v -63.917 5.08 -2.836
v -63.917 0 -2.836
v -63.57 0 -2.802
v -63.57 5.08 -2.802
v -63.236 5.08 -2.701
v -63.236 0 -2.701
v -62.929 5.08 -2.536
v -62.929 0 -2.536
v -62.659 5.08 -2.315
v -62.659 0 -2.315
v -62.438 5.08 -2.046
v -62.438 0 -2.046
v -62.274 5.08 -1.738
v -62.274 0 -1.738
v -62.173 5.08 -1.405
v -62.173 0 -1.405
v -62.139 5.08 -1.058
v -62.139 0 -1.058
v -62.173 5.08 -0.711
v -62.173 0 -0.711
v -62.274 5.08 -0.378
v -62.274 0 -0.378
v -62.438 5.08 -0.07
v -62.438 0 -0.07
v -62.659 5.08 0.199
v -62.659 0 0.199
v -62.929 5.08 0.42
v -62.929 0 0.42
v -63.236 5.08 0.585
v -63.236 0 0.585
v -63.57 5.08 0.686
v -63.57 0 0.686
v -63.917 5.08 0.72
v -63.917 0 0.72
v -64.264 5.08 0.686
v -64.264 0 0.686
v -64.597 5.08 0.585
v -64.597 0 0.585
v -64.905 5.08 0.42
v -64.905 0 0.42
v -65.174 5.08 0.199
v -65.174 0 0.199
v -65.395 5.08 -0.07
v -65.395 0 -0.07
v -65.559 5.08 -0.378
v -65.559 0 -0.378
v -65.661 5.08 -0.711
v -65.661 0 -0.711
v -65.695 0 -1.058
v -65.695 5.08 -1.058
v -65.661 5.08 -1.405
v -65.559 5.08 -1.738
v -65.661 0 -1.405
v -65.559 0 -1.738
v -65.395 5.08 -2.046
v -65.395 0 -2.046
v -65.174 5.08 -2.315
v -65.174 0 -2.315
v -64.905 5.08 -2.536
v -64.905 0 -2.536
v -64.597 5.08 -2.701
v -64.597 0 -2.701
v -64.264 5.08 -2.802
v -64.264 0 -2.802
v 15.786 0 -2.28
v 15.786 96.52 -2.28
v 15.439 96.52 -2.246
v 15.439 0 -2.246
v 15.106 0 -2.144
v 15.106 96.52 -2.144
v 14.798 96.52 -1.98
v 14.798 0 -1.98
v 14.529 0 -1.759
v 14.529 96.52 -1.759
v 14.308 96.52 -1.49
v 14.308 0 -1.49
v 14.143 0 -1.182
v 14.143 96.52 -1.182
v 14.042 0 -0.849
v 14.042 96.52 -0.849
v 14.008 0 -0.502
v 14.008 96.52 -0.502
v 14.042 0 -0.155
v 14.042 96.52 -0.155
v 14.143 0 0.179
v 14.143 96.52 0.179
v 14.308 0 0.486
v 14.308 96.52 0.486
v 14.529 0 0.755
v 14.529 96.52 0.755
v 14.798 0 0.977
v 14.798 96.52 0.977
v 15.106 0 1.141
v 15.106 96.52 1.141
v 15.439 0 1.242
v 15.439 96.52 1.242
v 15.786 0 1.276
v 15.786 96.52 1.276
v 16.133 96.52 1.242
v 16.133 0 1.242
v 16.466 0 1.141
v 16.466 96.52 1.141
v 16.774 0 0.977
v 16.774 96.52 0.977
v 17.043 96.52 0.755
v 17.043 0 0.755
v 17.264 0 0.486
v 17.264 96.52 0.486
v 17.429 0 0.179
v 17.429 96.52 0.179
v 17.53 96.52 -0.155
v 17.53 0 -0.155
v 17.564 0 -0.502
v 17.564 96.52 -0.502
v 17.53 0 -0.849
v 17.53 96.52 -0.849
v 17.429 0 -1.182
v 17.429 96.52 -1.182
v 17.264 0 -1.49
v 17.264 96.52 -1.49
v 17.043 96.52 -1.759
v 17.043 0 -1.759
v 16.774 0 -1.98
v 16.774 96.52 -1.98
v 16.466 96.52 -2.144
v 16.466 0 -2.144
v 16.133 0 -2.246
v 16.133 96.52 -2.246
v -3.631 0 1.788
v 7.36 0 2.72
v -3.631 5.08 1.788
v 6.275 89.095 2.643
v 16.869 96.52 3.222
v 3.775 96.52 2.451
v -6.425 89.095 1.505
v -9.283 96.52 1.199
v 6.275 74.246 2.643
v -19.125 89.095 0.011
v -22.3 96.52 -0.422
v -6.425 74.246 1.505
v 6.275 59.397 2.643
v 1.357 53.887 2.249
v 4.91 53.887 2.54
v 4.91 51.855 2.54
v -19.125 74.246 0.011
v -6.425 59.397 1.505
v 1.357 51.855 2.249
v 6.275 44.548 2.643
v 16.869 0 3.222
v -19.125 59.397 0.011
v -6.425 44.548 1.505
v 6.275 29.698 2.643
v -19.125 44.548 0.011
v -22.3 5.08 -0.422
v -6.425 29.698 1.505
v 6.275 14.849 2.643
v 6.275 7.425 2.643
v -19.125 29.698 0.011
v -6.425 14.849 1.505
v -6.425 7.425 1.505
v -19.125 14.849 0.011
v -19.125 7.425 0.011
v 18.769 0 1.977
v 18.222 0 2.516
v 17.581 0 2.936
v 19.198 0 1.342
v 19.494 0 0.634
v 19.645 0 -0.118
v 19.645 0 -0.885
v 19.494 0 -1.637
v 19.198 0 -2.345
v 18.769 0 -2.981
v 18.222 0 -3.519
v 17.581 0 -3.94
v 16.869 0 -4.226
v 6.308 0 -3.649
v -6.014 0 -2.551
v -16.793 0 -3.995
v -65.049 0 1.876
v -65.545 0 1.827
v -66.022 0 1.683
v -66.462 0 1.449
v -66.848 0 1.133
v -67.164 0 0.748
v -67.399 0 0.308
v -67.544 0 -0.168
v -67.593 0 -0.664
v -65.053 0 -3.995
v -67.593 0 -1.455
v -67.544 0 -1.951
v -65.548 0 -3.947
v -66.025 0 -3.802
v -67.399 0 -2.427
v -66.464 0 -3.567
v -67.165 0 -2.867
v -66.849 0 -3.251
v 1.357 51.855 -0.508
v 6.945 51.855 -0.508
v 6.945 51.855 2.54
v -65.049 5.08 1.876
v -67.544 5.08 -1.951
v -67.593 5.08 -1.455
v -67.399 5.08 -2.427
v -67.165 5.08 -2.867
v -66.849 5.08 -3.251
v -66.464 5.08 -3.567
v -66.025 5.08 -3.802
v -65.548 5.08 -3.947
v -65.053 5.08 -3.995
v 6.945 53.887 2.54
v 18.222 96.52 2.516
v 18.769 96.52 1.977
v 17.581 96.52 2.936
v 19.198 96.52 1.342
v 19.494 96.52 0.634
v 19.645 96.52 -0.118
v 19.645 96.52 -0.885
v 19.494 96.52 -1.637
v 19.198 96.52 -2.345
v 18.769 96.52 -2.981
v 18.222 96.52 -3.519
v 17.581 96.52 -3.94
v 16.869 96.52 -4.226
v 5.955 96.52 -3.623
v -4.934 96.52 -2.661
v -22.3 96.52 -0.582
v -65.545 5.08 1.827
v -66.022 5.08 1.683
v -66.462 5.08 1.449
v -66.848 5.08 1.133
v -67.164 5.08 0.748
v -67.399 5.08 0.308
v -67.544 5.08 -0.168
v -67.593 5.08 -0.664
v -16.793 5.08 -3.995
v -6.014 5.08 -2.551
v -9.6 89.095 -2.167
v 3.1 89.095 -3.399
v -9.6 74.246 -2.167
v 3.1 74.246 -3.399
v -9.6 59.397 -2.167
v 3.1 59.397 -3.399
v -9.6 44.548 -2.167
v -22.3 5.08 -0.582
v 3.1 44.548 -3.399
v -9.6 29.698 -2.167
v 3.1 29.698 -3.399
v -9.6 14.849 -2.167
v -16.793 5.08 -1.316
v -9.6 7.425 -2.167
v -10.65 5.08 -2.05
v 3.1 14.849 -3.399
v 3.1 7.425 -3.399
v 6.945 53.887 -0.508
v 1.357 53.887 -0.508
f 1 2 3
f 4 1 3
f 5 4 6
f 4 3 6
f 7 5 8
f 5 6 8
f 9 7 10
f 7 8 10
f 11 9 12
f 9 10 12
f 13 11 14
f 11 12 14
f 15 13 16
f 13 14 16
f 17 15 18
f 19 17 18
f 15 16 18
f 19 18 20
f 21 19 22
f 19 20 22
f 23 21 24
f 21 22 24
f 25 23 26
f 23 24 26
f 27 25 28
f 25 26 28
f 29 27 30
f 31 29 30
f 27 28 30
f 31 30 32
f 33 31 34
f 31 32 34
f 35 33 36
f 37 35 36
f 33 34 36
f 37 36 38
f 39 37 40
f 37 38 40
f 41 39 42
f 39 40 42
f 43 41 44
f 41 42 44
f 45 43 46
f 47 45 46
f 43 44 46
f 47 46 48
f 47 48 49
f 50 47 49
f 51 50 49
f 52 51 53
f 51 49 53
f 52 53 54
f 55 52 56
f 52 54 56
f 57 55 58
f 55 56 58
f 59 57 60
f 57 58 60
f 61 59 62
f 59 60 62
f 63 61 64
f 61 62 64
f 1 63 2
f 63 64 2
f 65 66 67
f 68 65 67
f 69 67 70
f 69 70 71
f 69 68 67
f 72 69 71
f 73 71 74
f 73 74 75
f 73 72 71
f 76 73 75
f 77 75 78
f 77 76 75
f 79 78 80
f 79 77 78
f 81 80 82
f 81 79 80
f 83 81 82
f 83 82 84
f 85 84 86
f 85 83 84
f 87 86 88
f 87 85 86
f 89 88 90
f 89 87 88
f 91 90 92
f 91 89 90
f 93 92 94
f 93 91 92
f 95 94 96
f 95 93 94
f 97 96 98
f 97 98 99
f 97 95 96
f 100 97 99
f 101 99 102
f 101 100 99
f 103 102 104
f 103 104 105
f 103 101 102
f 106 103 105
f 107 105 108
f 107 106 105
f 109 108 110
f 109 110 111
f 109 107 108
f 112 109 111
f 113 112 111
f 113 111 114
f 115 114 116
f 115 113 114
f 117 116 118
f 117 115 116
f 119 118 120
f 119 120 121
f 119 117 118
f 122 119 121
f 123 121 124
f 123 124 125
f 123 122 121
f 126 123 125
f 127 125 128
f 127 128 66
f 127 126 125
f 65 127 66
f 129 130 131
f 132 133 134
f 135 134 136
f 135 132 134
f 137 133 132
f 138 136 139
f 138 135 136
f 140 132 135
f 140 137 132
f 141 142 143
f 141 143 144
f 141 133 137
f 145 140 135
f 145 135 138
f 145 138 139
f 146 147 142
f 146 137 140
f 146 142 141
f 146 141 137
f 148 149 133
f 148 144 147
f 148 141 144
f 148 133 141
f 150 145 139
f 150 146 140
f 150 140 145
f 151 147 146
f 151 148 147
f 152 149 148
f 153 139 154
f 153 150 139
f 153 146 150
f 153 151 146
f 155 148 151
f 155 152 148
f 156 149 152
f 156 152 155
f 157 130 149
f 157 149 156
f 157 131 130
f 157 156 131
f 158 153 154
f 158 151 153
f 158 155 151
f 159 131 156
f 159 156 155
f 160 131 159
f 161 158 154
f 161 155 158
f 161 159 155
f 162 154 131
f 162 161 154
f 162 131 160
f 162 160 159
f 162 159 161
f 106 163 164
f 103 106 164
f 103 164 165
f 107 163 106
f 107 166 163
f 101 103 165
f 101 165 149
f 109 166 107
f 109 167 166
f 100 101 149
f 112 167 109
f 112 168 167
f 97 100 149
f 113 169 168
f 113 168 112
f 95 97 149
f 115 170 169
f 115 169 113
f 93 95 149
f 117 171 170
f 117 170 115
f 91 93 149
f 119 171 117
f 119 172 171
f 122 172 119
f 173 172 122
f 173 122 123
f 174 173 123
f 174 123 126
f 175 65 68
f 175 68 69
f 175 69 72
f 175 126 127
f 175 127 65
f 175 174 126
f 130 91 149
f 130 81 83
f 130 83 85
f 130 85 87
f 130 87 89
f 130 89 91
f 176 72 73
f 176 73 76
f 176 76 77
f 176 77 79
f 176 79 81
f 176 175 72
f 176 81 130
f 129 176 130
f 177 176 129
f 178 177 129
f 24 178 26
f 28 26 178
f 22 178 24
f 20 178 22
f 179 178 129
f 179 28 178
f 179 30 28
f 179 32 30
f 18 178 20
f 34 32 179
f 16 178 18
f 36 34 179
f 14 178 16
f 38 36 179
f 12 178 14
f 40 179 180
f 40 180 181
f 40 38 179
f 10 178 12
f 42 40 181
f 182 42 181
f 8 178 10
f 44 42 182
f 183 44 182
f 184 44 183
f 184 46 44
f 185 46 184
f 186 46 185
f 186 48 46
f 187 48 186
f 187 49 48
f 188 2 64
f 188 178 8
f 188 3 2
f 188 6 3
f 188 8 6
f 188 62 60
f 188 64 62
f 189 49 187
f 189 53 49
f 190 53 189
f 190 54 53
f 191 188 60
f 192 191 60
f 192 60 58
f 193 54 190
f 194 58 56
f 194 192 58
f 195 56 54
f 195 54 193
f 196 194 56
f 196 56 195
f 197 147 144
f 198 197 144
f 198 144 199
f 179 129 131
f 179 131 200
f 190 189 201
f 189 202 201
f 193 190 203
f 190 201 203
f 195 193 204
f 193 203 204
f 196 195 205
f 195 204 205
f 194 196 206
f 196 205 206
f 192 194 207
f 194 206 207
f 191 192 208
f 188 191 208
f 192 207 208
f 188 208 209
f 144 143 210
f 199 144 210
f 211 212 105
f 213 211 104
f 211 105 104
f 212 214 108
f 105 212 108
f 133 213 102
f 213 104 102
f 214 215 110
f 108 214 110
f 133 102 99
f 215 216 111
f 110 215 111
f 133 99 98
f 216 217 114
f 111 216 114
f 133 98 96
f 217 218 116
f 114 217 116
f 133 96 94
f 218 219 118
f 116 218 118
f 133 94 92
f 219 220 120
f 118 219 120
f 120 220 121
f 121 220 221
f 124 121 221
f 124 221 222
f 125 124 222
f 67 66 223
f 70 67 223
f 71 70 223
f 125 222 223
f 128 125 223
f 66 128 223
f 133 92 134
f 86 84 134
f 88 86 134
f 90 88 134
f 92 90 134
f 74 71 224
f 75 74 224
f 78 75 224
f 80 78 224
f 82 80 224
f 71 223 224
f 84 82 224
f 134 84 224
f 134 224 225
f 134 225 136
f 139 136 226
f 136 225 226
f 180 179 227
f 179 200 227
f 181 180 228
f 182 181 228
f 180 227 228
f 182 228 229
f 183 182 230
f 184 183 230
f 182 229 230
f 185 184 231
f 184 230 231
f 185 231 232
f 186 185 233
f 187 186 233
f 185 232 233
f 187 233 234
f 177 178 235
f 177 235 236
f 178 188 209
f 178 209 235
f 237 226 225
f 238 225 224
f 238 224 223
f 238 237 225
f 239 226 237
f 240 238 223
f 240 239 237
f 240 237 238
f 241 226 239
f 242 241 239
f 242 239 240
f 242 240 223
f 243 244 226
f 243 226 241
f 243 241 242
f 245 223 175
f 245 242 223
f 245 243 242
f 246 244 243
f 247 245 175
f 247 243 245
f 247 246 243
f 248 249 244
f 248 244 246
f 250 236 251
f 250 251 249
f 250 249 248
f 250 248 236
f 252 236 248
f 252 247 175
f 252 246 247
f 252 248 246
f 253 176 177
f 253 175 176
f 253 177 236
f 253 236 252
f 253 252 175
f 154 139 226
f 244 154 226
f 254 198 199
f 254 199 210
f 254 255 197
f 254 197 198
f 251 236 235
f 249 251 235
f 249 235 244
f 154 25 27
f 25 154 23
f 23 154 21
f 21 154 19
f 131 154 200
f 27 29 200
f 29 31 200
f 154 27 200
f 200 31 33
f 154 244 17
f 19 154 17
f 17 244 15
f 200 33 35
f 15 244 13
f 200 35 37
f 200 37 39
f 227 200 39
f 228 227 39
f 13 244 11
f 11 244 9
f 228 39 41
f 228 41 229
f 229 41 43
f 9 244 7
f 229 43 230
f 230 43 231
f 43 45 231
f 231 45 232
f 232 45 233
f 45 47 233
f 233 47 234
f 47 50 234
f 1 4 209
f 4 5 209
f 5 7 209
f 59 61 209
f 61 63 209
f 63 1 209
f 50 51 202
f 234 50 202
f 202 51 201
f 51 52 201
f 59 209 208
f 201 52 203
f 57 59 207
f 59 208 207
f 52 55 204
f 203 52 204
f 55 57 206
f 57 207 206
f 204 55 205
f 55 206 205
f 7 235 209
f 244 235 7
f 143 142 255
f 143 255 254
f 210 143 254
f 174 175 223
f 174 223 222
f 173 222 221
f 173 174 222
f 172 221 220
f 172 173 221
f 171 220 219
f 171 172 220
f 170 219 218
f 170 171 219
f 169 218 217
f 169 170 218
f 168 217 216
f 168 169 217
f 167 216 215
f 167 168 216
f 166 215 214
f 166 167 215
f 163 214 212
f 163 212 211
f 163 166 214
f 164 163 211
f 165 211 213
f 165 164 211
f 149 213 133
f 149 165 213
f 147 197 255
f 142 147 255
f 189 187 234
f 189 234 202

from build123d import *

# Parameters (mm, degrees)
SKETCH1_R           = 1.778
BOSS_EXTRUDE1_DEPTH = 96.52
SKETCH2_W           = 5.588
SKETCH2_H           = 2.032
CUT_EXTRUDE1_DEPTH  = 3.048
BOSS_EXTRUDE4_DEPTH = 5.08
SKETCH7_R           = 1.778
CUT_EXTRUDE2_DEPTH  = 5.08
FILLET1_R           = 2.54


with BuildPart() as part:
    # Sketch1 → Boss-Extrude1 (new body)
    with BuildSketch(Plane(origin=(0, 0, 0), x_dir=(1, 0, 0), z_dir=(0, 1, 0))):
        with BuildLine():
            Line((-22.300033558, 0.421731993), (-22.300033558, 0.581751993))
            add(Edge.make_bspline(
                [(-22.300033558, 0.581751993), (-21.241941414, 0.727701793), (-19.126856353, 1.01944977), (-15.951376845, 1.424429686), (-12.776341364, 1.809105283), (-9.601168328, 2.170624627), (-6.426111922, 2.511711497), (-3.251098671, 2.831902905), (-0.076148645, 3.130340148), (3.098918671, 3.403326924), (6.273871033, 3.651308872), (9.470064679, 3.869981778), (12.666162626, 4.057112429), (15.139925914, 4.164340231), (16.533881684, 4.214568226), (16.869130939, 4.225691153)],
                knots=[0, 0, 0, 0, 0.024634231, 0.04924287, 0.07382978, 0.098396751, 0.122945996, 0.147478562, 0.171994581, 0.196493552, 0.220976186, 0.245442093, 0.270380478, 0.294812969, 0.302548899, 0.302548899, 0.302548899, 0.302548899], degree=3))
            ThreePointArc((16.869130939, 4.225691153), (19.66431815, 0.501741993), (16.869130939, -3.222207168))
            add(Edge.make_bspline(
                [(16.869130939, -3.222207168), (16.533881684, -3.21108424), (15.139925914, -3.160856245), (12.666162626, -3.053628443), (9.470064679, -2.866497792), (6.273871033, -2.647824886), (3.098918671, -2.399842938), (-0.076148645, -2.126856163), (-3.251098671, -1.82841892), (-6.426111922, -1.508227511), (-9.601168328, -1.167140642), (-12.776341364, -0.805621298), (-15.951376845, -0.420945701), (-19.126856353, -0.015965784), (-21.241941414, 0.275782192), (-22.300033558, 0.421731993)],
                knots=[0.697451101, 0.697451101, 0.697451101, 0.697451101, 0.705187031, 0.729619522, 0.754557907, 0.779023814, 0.803506448, 0.828005419, 0.852521438, 0.877054004, 0.901603249, 0.92617022, 0.95075713, 0.975365769, 1, 1, 1, 1], degree=3))
        make_face()
        with Locations(Location((15.786068277, 0.501741993, 0), (0, 0, 90))):
            Circle(SKETCH1_R, mode=Mode.SUBTRACT)
    extrude(amount=BOSS_EXTRUDE1_DEPTH)

    # Sketch2 → Cut-Extrude1 (cut)
    with BuildSketch(Plane.XY.offset(2.54)):
        with Locations((4.151336485, 52.87147878)):
            Rectangle(SKETCH2_W, SKETCH2_H)
    extrude(amount=-CUT_EXTRUDE1_DEPTH, mode=Mode.SUBTRACT)

    # Sketch3 → Boss-Extrude4 (add)
    with BuildSketch(Plane(origin=(0, 0, 0), x_dir=(-1, 0, 0), z_dir=(0, -1, 0))):
        with BuildLine():
            add(Edge.make_bspline(
                [(10.650355893, 2.050005208), (11.358767299, 1.970085754), (13.126070598, 1.766733378), (15.173174827, 1.518713775), (16.511893664, 1.35112125), (16.792774705, 1.315680774)],
                knots=[0.212277068, 0.212277068, 0.212277068, 0.212277068, 0.228719118, 0.253306028, 0.259835455, 0.259835455, 0.259835455, 0.259835455], degree=3))
            Line((16.792774705, 1.315680774), (16.792774705, 3.995440037))
            Line((16.792774705, 3.995440037), (6.014233657, 2.550945433))
            add(Edge.make_bspline(
                [(6.014233657, 2.550945433), (6.151172956, 2.53680216), (7.346849115, 2.412799437), (8.892338702, 2.246772086), (10.300290918, 2.089497799), (10.650355893, 2.050005208)],
                knots=[0.176427807, 0.176427807, 0.176427807, 0.176427807, 0.179602902, 0.204152148, 0.212277068, 0.212277068, 0.212277068, 0.212277068], degree=3))
        make_face()
        with BuildLine():
            Line((16.792774705, 3.995440037), (16.792774705, 1.315680774))
            add(Edge.make_bspline(
                [(16.792774705, 1.315680774), (17.570501205, 1.217550273), (19.407308985, 0.980765043), (21.241941414, 0.727701793), (22.300033558, 0.581751993)],
                knots=[0.259835455, 0.259835455, 0.259835455, 0.259835455, 0.277914667, 0.302548899, 0.302548899, 0.302548899, 0.302548899], degree=3))
            Line((22.300033558, 0.581751993), (67.592774705, 0.581751993))
            Line((67.592774705, 0.581751993), (67.592774705, 3.995440037))
            Line((67.592774705, 3.995440037), (16.792774705, 3.995440037))
        make_face()
        with BuildLine():
            Line((67.592774705, 0.581751993), (22.300033558, 0.581751993))
            Line((22.300033558, 0.581751993), (22.300033558, 0.421731993))
            add(Edge.make_bspline(
                [(22.300033558, 0.421731993), (21.241941414, 0.275782192), (19.126856353, -0.015965784), (15.951376845, -0.420945701), (12.776341364, -0.805621298), (9.601168328, -1.167140642), (6.552887523, -1.494608385), (4.562438812, -1.696123873), (3.630729661, -1.787654474)],
                knots=[0.697451101, 0.697451101, 0.697451101, 0.697451101, 0.722085333, 0.746693972, 0.771280882, 0.795847852, 0.820397098, 0.841988969, 0.841988969, 0.841988969, 0.841988969], degree=3))
            Line((3.630729661, -1.787654474), (67.592774705, -1.879270853))
            Line((67.592774705, -1.879270853), (67.592774705, 0.581751993))
        make_face()
    extrude(amount=-BOSS_EXTRUDE4_DEPTH)

    # Sketch7 → Cut-Extrude2 (cut)
    with BuildSketch(Plane(origin=(0, 0, 0), x_dir=(-1, 0, 0), z_dir=(0, -1, 0))):
        with Locations(Location((63.916722706, 1.058084592, 0), (0, 0, 90))):
            Circle(SKETCH7_R)
    extrude(amount=-CUT_EXTRUDE2_DEPTH, mode=Mode.SUBTRACT)

    # Fillet1
    fillet1_edges = [part.edges().sort_by_distance(p)[0] for p in [
        (-67.592774705, 2.54, -3.995440037),
        (-67.592774705, 2.54, 1.879270853),
    ]]
    fillet(fillet1_edges, radius=FILLET1_R)


solid = part.part
